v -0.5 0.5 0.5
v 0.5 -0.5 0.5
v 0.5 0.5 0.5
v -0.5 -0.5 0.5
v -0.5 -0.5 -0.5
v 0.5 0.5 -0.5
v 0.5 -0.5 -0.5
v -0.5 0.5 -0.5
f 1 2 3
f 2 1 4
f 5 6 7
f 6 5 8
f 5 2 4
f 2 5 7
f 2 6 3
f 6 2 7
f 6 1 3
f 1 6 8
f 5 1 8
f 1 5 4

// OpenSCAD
/// Demonstrate some matrix math

function translation_matrix(pos) =
	[
		[ 1, 0, pos[0]],
		[ 0, 1, pos[1]],
		[ 0, 0,      1],
	];

function rotation_matrix(angle) =
	// Angle?
	is_num(angle) ? [
		[ cos(angle),-sin(angle), 0],
		[ sin(angle), cos(angle), 0],
		[          0,          0, 1],
	] :
	assert(false, str("rotation_matrix argument should be an angle, in degrees; got: ", angle));

vec = [1,0,1];
matrix = [
	[0,1, 5],
	[1,0,10],
];

//echo( vec=vec, matrix=matrix, vec_times_matrix=vec*matrix, matrix_times_vec=matrix*vec );
// echo( vec=vec, matrix=matrix, matrix_times_vec=matrix*vec );

compound_matrix =
	[
		// Translate([12,24])
		[1,0,12],
		[0,1,24],
		[0,0, 1],
	] * [
		// Rotate(90)
		[ 0, -1, 0],
		[ 1,  0, 0],
		[ 0,  0, 1],
	];

//echo( compound_matrix=compound_matrix );
//echo( compound_matrix_times_vec=compound_matrix*[1,0,1] );

compound_matrix2 = translation_matrix([12,24]) * rotation_matrix(90);

//echo( compound_matrix2=compound_matrix );
//echo( compound_matrix2_times_vec=compound_matrix2*[1,0,1] );

assert( compound_matrix == compound_matrix2 );
assert( compound_matrix2*[1,0,1] == [12,25,1] );

/// Okay with that settled...

cube([1,1,1], center=true);
